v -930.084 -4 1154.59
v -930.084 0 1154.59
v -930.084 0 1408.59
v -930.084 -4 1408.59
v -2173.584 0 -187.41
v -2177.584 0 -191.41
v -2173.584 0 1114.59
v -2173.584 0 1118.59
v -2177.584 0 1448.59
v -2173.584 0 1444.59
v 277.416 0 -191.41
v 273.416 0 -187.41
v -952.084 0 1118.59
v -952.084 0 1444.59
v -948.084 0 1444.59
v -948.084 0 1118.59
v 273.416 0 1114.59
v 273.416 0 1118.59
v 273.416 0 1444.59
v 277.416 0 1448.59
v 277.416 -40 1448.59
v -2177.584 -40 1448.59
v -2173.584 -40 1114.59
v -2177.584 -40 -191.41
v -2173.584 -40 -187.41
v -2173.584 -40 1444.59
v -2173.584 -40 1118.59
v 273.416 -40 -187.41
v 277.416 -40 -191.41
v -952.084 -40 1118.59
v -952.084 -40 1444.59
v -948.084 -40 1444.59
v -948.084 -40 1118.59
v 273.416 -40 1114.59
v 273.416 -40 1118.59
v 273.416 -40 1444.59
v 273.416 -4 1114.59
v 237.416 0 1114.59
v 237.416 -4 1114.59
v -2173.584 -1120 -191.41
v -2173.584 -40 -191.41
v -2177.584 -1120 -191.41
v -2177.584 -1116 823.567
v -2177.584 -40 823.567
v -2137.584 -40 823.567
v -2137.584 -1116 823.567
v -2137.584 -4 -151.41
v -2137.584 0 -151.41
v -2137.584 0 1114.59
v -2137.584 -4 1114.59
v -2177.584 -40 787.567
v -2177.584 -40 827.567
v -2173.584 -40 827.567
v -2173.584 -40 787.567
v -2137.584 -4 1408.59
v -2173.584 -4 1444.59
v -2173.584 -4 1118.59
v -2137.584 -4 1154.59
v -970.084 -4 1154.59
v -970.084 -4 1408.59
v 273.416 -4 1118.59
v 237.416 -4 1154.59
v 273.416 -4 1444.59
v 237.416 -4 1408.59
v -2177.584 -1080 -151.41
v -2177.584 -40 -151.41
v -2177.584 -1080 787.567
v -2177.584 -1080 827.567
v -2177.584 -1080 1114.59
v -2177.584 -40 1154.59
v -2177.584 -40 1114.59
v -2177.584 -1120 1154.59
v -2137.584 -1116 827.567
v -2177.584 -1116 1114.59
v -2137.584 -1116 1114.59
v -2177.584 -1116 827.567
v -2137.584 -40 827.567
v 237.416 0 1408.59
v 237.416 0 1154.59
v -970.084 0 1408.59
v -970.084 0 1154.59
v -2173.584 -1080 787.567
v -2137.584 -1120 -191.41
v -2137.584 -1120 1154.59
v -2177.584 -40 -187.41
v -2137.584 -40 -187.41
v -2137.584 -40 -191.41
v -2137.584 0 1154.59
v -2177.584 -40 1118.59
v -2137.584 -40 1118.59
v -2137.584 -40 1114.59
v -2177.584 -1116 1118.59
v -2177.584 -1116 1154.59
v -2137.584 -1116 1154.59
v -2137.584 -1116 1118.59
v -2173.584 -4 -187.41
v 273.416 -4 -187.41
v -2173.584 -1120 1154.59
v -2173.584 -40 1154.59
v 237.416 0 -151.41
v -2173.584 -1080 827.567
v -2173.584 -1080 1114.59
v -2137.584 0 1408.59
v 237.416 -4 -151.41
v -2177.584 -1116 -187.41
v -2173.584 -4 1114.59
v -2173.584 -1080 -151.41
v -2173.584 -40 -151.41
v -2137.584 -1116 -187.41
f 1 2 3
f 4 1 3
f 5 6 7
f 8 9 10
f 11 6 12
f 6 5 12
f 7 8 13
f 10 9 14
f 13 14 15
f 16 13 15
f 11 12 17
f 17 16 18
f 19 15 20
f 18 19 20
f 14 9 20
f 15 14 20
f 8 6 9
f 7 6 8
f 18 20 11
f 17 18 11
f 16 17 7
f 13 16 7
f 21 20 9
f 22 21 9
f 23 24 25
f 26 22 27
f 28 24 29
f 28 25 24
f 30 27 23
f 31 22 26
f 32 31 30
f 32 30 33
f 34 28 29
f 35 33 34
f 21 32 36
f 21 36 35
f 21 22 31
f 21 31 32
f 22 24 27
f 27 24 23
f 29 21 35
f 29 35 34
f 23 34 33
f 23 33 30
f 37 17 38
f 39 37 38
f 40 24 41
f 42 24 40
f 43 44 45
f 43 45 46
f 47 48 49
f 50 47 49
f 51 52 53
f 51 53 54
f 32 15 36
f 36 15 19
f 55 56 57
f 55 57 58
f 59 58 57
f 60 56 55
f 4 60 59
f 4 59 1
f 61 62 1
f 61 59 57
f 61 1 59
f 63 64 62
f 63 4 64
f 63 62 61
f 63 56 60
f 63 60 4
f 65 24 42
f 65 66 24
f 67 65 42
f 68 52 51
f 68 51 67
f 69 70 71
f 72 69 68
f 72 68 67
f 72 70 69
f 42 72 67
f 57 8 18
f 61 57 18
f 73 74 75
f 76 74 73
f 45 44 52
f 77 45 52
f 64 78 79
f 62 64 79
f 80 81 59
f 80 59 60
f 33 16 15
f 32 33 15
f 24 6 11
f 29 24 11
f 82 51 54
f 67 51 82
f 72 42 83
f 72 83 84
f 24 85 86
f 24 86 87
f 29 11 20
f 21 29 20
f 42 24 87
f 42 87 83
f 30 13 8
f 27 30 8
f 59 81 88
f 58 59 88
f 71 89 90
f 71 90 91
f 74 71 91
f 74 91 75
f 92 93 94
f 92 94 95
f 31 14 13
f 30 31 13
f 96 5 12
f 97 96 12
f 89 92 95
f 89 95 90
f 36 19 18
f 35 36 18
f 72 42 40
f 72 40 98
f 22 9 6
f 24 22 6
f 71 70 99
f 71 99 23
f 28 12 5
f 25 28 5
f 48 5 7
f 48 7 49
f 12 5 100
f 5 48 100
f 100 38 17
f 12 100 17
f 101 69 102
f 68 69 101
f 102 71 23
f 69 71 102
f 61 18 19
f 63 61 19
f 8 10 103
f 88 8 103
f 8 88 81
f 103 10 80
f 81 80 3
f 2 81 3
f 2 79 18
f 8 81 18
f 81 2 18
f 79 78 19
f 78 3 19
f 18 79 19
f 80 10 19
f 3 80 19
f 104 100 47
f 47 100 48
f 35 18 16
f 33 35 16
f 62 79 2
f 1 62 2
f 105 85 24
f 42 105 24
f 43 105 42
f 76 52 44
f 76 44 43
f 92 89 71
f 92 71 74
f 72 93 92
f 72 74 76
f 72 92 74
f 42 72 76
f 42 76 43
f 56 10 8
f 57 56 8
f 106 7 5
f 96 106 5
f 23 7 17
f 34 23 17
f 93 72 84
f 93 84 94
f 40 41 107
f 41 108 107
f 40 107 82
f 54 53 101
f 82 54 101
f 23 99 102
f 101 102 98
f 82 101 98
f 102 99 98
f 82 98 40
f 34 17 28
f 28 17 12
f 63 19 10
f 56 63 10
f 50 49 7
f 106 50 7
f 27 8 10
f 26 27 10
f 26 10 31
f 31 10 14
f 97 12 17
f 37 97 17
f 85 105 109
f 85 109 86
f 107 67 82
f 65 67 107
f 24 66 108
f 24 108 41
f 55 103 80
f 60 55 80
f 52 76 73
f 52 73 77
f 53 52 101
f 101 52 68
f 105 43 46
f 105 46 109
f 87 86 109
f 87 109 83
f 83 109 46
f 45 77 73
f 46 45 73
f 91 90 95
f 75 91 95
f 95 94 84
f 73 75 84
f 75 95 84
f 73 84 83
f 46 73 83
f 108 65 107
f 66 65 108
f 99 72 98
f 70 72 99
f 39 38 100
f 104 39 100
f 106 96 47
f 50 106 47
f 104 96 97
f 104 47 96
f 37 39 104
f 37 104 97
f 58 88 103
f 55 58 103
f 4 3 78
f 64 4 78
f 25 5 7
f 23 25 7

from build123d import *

# Parameters (mm, degrees)
F1_DEPTH = 4
F0_W     = 18
F0_H     = 254
F0_W_2   = 4
F0_H_2   = 36
F0_W_3   = 36
F0_H_3   = 4
F2_DEPTH = 40
F3_W     = 1076
F3_H     = 36
F3_W_2   = 36
F3_W_3   = 1040
F3_H_2   = 4
F3_H_3   = 287.0236907005
F4_DEPTH = 4
F5_DEPTH = 40


with BuildPart() as f1:
    # F0 (on Front) → F1 (new body)
    with BuildSketch(Plane.XZ):
        Polygon((-2173.5842666626, 1114.590233326), (-2173.5842666626, -187.409766674), (-2137.5842666626, -151.409766674), (-2137.5842666626, 1114.590233326), align=None)
        Polygon((237.4157333374, -151.409766674), (273.4157333374, -187.409766674), (273.4157333374, 1114.590233326), (237.4157333374, 1114.590233326), align=None)
        Polygon((-2137.5842666626, -151.409766674), (-2173.5842666626, -187.409766674), (273.4157333374, -187.409766674), (237.4157333374, -151.409766674), align=None)
    extrude(amount=F1_DEPTH)


with BuildPart() as f1b:
    # F0 (on Front) → F1, piece 2 (new body)
    with BuildSketch(Plane.XZ):
        Polygon((-2137.5842666626, 1408.590233326), (-2173.5842666626, 1444.590233326), (-2173.5842666626, 1118.590233326), (-2137.5842666626, 1118.590233326), (-2137.5842666626, 1154.590233326), align=None)
        Polygon((-970.0842666626, 1154.590233326), (-2137.5842666626, 1154.590233326), (-2137.5842666626, 1118.590233326), (-952.0842666626, 1118.590233326), (-952.0842666626, 1154.590233326), align=None)
        Polygon((-952.0842666626, 1444.590233326), (-2173.5842666626, 1444.590233326), (-2137.5842666626, 1408.590233326), (-970.0842666626, 1408.590233326), (-952.0842666626, 1408.590233326), align=None)
        with Locations((-961.0842666626, 1281.590233326)):
            Rectangle(F0_W, F0_H)
        with Locations((-939.0842666626, 1281.590233326)):
            Rectangle(F0_W, F0_H)
        Polygon((237.4157333374, 1118.590233326), (237.4157333374, 1154.590233326), (-930.0842666626, 1154.590233326), (-948.0842666626, 1154.590233326), (-948.0842666626, 1118.590233326), align=None)
        Polygon((237.4157333374, 1408.590233326), (273.4157333374, 1444.590233326), (-948.0842666626, 1444.590233326), (-948.0842666626, 1408.590233326), (-930.0842666626, 1408.590233326), align=None)
        Polygon((273.4157333374, 1118.590233326), (273.4157333374, 1444.590233326), (237.4157333374, 1408.590233326), (237.4157333374, 1154.590233326), (237.4157333374, 1118.590233326), align=None)
        with Locations((-950.0842666626, 1281.590233326)):
            Rectangle(F0_W_2, F0_H)
        with Locations((-950.0842666626, 1136.590233326)):
            Rectangle(F0_W_2, F0_H_2)
        with Locations((-950.0842666626, 1426.590233326)):
            Rectangle(F0_W_2, F0_H_2)
    extrude(amount=F1_DEPTH)


with BuildPart() as f2:
    # F0 (on Front) → F2 (new body)
    with BuildSketch(Plane.XZ):
        Polygon((277.4157333374, 1448.590233326), (-2177.5842666626, 1448.590233326), (-2173.5842666626, 1444.590233326), (-952.0842666626, 1444.590233326), (-948.0842666626, 1444.590233326), (273.4157333374, 1444.590233326), align=None)
        with Locations((-950.0842666626, 1426.590233326)):
            Rectangle(F0_W_2, F0_H_2)
        with Locations((-950.0842666626, 1281.590233326)):
            Rectangle(F0_W_2, F0_H)
        with Locations((-950.0842666626, 1136.590233326)):
            Rectangle(F0_W_2, F0_H_2)
        Polygon((-952.0842666626, 1118.590233326), (-2137.5842666626, 1118.590233326), (-2137.5842666626, 1114.590233326), (237.4157333374, 1114.590233326), (237.4157333374, 1118.590233326), (-948.0842666626, 1118.590233326), align=None)
        Polygon((277.4157333374, -191.409766674), (277.4157333374, 1448.590233326), (273.4157333374, 1444.590233326), (273.4157333374, 1118.590233326), (273.4157333374, 1114.590233326), (273.4157333374, -187.409766674), align=None)
        Polygon((-2173.5842666626, 1444.590233326), (-2177.5842666626, 1448.590233326), (-2177.5842666626, -191.409766674), (-2173.5842666626, -187.409766674), (-2173.5842666626, 1114.590233326), (-2173.5842666626, 1118.590233326), align=None)
        with Locations((-2155.5842666626, 1116.590233326)):
            Rectangle(F0_W_3, F0_H_3)
        with Locations((255.4157333374, 1116.590233326)):
            Rectangle(F0_W_3, F0_H_3)
        Polygon((-2173.5842666626, -187.409766674), (-2177.5842666626, -191.409766674), (277.4157333374, -191.409766674), (273.4157333374, -187.409766674), align=None)
    extrude(amount=F2_DEPTH)


with BuildPart() as f4:
    # F3 (on face) → F4 (new body)
    with BuildSketch(Plane(origin=(-2177.5842666626, 0, 0), x_dir=(0, -1, 0), z_dir=(-1, 0, 0))):
        Polygon((40, -187.409766674), (40, -191.409766674), (1120, -191.409766674), (1116, -187.409766674), align=None)
        Polygon((1116, -187.409766674), (1120, -191.409766674), (1120, 1154.590233326), (1116, 1154.590233326), (1116, 1118.590233326), (1116, 1114.590233326), (1116, 827.5665426254), (1116, 823.5665426254), (1116, 787.5665426254), align=None)
        Polygon((40, -151.409766674), (40, -187.409766674), (1116, -187.409766674), (1080, -151.409766674), align=None)
        Polygon((1080, -151.409766674), (1116, -187.409766674), (1116, 787.5665426254), (1080, 787.5665426254), align=None)
        with Locations((578, 1136.590233326)):
            Rectangle(F3_W, F3_H)
        with Locations((1098, 805.5665426254)):
            Rectangle(F3_W_2, F3_H)
        Polygon((1116, 1114.590233326), (1116, 1118.590233326), (40, 1118.590233326), (40, 1114.590233326), (1080, 1114.590233326), align=None)
        with Locations((560, 805.5665426254)):
            Rectangle(F3_W_3, F3_H)
        with Locations((1098, 825.5665426254)):
            Rectangle(F3_W_2, F3_H_2)
        with Locations((1098, 971.0783879757)):
            Rectangle(F3_W_2, F3_H_3)
        with Locations((560, 825.5665426254)):
            Rectangle(F3_W_3, F3_H_2)
    extrude(amount=-F4_DEPTH)


with BuildPart() as f5:
    # F3 (on face) → F5 (new body)
    with BuildSketch(Plane(origin=(-2177.5842666626, 0, 0), x_dir=(0, -1, 0), z_dir=(-1, 0, 0))):
        with Locations((560, 825.5665426254)):
            Rectangle(F3_W_3, F3_H_2)
        with Locations((1098, 825.5665426254)):
            Rectangle(F3_W_2, F3_H_2)
        Polygon((1116, -187.409766674), (1120, -191.409766674), (1120, 1154.590233326), (1116, 1154.590233326), (1116, 1118.590233326), (1116, 1114.590233326), (1116, 827.5665426254), (1116, 823.5665426254), (1116, 787.5665426254), align=None)
        Polygon((1116, 1114.590233326), (1116, 1118.590233326), (40, 1118.590233326), (40, 1114.590233326), (1080, 1114.590233326), align=None)
        Polygon((40, -187.409766674), (40, -191.409766674), (1120, -191.409766674), (1116, -187.409766674), align=None)
    extrude(amount=-F5_DEPTH)


solid = Compound([f1.part, f1b.part, f2.part, f4.part, f5.part])
